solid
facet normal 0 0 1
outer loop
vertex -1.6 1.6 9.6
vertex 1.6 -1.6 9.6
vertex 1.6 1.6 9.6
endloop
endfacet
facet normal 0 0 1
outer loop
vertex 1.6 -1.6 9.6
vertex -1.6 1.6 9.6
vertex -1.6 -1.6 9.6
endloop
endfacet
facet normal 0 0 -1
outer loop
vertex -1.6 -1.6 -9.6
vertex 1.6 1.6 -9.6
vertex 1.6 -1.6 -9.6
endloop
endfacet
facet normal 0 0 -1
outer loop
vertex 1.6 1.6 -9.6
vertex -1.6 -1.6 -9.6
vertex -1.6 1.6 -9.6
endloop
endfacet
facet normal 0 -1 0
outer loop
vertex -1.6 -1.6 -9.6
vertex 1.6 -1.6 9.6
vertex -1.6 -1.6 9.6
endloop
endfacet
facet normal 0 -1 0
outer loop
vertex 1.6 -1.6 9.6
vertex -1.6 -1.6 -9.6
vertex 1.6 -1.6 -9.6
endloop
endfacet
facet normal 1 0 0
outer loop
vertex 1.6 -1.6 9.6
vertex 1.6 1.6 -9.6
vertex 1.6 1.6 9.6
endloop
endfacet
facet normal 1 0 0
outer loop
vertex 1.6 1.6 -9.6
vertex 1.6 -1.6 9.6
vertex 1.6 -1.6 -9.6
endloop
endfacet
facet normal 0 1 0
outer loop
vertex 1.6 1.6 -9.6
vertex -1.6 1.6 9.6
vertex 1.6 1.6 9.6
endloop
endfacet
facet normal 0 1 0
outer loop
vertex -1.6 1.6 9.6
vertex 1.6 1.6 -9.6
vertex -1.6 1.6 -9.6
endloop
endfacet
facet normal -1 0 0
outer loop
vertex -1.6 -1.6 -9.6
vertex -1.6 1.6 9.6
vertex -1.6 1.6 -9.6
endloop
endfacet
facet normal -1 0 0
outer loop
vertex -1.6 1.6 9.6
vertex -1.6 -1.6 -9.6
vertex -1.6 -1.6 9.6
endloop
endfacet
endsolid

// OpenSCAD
size=32; //block=32 //item=8

cube([size*0.10,size*0.10,size*0.60],center=true);
